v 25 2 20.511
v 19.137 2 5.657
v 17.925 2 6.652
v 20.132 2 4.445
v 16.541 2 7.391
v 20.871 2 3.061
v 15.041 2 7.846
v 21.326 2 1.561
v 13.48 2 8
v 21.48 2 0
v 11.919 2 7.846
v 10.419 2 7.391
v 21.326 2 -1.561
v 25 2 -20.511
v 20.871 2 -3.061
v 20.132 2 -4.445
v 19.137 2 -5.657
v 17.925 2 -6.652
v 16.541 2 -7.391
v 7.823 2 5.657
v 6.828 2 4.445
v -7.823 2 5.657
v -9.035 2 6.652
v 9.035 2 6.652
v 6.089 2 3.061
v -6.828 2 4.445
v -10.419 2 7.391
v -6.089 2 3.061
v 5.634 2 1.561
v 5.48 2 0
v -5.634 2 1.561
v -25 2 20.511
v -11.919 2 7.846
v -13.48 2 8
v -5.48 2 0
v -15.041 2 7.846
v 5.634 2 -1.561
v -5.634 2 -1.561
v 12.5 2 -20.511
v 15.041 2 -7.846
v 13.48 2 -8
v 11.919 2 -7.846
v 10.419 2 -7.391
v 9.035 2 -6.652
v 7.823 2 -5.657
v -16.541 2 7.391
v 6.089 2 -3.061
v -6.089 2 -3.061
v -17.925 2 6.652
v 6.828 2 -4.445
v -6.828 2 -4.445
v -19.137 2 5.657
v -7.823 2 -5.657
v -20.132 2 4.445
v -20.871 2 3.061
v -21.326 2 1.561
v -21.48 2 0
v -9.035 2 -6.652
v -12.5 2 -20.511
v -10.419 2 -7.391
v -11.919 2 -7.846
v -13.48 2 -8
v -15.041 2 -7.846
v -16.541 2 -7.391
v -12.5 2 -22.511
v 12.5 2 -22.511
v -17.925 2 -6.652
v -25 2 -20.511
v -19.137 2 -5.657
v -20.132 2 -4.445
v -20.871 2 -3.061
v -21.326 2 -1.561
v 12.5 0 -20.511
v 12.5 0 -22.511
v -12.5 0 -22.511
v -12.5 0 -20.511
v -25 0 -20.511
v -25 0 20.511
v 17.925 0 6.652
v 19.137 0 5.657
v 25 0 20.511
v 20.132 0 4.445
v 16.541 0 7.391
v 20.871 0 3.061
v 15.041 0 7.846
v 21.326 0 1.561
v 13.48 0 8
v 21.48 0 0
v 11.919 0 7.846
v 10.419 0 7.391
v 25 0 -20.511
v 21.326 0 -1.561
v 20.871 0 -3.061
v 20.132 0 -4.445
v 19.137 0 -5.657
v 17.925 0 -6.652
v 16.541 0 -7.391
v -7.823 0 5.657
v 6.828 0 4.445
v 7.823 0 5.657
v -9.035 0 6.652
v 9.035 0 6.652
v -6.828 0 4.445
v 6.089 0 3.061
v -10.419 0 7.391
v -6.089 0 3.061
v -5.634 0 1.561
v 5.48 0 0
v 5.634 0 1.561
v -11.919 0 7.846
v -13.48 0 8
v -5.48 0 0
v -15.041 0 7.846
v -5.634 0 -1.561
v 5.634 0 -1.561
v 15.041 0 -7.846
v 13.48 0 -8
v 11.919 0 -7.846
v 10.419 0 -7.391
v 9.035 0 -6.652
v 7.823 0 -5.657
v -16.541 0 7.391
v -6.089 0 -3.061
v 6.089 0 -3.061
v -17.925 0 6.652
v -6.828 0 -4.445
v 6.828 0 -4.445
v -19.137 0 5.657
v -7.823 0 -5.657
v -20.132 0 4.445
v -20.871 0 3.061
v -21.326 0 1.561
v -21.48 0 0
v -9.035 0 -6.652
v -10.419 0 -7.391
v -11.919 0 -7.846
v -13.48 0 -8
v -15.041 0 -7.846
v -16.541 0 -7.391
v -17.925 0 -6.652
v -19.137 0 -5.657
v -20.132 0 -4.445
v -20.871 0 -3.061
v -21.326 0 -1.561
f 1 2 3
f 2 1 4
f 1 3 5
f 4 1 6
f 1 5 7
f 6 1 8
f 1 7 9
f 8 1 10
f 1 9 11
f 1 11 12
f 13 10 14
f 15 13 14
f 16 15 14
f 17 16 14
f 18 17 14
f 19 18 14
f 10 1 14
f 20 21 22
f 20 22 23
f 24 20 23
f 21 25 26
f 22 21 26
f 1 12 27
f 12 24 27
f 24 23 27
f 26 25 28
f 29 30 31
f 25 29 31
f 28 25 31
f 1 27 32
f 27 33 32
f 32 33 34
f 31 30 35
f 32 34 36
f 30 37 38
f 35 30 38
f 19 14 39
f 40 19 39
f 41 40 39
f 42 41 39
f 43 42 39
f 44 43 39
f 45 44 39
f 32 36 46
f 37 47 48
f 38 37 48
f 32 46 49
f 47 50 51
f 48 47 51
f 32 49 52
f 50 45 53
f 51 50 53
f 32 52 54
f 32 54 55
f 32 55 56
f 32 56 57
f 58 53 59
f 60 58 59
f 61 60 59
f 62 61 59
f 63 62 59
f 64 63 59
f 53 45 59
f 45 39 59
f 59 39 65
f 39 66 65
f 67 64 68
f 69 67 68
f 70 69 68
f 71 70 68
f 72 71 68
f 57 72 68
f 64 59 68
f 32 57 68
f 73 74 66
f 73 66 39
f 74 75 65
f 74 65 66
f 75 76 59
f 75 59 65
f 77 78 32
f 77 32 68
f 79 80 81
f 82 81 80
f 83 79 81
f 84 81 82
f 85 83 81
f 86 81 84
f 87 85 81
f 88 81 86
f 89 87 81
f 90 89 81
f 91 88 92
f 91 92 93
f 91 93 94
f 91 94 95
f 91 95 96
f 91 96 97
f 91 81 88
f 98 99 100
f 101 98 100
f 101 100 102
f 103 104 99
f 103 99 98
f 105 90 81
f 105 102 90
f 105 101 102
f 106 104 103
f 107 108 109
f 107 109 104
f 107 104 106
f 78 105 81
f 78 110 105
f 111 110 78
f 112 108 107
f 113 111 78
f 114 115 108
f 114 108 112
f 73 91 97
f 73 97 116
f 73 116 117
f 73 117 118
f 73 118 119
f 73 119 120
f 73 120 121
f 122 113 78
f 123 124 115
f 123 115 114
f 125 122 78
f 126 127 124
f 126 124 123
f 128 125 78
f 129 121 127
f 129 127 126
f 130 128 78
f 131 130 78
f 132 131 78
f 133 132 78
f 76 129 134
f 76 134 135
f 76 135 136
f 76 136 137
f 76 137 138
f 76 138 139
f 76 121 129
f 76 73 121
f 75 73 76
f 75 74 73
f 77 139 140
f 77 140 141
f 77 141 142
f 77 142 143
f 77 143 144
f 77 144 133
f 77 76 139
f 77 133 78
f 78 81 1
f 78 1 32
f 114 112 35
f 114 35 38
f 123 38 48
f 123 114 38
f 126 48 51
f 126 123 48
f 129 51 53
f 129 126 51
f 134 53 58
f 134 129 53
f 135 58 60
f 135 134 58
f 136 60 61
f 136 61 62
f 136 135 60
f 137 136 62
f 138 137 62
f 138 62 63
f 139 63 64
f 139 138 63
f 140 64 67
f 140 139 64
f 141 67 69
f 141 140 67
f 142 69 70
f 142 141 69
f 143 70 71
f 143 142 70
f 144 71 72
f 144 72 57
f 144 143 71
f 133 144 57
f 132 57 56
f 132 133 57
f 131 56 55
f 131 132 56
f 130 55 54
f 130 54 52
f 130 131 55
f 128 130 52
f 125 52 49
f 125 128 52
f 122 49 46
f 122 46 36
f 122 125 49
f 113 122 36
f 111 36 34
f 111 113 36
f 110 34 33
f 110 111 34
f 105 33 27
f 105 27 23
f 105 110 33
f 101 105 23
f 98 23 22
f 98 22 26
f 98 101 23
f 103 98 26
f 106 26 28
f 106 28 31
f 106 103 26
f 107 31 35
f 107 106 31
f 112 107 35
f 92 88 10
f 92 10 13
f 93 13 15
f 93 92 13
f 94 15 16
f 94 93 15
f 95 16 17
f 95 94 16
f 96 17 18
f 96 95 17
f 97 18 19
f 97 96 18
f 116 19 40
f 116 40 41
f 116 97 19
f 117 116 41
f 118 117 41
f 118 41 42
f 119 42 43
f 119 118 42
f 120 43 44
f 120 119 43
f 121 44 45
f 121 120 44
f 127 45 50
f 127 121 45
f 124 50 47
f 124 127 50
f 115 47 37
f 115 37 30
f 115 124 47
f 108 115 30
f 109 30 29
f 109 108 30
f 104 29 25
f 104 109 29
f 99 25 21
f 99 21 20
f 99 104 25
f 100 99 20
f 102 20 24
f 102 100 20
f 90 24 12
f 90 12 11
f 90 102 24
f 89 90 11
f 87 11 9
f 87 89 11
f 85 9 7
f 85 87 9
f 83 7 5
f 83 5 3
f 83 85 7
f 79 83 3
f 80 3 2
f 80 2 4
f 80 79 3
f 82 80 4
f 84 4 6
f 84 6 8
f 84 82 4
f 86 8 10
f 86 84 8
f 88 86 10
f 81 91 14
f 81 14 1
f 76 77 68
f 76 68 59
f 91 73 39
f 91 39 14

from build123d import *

# Parameters (mm, degrees)
SKETCH_1_R      = 8
EXTRUDE_1_DEPTH = 2


with BuildPart() as part:
    # 草圖1 → 填料-伸長1 (new body)
    with BuildSketch(Plane(origin=(0, 0, 0), x_dir=(1, 0, 0), z_dir=(0, 1, 0))):
        Polygon((12.5, 20.511459459), (25, 20.511459459), (25, -20.511459459), (-25, -20.511459459), (-25, 20.511459459), (-12.5, 20.511459459), (-12.5, 22.511459459), (12.5, 22.511459459), align=None)
        with Locations((-13.48, 0)):
            Circle(SKETCH_1_R, mode=Mode.SUBTRACT)
        with Locations((13.48, 0)):
            Circle(SKETCH_1_R, mode=Mode.SUBTRACT)
    extrude(amount=EXTRUDE_1_DEPTH)


solid = part.part
